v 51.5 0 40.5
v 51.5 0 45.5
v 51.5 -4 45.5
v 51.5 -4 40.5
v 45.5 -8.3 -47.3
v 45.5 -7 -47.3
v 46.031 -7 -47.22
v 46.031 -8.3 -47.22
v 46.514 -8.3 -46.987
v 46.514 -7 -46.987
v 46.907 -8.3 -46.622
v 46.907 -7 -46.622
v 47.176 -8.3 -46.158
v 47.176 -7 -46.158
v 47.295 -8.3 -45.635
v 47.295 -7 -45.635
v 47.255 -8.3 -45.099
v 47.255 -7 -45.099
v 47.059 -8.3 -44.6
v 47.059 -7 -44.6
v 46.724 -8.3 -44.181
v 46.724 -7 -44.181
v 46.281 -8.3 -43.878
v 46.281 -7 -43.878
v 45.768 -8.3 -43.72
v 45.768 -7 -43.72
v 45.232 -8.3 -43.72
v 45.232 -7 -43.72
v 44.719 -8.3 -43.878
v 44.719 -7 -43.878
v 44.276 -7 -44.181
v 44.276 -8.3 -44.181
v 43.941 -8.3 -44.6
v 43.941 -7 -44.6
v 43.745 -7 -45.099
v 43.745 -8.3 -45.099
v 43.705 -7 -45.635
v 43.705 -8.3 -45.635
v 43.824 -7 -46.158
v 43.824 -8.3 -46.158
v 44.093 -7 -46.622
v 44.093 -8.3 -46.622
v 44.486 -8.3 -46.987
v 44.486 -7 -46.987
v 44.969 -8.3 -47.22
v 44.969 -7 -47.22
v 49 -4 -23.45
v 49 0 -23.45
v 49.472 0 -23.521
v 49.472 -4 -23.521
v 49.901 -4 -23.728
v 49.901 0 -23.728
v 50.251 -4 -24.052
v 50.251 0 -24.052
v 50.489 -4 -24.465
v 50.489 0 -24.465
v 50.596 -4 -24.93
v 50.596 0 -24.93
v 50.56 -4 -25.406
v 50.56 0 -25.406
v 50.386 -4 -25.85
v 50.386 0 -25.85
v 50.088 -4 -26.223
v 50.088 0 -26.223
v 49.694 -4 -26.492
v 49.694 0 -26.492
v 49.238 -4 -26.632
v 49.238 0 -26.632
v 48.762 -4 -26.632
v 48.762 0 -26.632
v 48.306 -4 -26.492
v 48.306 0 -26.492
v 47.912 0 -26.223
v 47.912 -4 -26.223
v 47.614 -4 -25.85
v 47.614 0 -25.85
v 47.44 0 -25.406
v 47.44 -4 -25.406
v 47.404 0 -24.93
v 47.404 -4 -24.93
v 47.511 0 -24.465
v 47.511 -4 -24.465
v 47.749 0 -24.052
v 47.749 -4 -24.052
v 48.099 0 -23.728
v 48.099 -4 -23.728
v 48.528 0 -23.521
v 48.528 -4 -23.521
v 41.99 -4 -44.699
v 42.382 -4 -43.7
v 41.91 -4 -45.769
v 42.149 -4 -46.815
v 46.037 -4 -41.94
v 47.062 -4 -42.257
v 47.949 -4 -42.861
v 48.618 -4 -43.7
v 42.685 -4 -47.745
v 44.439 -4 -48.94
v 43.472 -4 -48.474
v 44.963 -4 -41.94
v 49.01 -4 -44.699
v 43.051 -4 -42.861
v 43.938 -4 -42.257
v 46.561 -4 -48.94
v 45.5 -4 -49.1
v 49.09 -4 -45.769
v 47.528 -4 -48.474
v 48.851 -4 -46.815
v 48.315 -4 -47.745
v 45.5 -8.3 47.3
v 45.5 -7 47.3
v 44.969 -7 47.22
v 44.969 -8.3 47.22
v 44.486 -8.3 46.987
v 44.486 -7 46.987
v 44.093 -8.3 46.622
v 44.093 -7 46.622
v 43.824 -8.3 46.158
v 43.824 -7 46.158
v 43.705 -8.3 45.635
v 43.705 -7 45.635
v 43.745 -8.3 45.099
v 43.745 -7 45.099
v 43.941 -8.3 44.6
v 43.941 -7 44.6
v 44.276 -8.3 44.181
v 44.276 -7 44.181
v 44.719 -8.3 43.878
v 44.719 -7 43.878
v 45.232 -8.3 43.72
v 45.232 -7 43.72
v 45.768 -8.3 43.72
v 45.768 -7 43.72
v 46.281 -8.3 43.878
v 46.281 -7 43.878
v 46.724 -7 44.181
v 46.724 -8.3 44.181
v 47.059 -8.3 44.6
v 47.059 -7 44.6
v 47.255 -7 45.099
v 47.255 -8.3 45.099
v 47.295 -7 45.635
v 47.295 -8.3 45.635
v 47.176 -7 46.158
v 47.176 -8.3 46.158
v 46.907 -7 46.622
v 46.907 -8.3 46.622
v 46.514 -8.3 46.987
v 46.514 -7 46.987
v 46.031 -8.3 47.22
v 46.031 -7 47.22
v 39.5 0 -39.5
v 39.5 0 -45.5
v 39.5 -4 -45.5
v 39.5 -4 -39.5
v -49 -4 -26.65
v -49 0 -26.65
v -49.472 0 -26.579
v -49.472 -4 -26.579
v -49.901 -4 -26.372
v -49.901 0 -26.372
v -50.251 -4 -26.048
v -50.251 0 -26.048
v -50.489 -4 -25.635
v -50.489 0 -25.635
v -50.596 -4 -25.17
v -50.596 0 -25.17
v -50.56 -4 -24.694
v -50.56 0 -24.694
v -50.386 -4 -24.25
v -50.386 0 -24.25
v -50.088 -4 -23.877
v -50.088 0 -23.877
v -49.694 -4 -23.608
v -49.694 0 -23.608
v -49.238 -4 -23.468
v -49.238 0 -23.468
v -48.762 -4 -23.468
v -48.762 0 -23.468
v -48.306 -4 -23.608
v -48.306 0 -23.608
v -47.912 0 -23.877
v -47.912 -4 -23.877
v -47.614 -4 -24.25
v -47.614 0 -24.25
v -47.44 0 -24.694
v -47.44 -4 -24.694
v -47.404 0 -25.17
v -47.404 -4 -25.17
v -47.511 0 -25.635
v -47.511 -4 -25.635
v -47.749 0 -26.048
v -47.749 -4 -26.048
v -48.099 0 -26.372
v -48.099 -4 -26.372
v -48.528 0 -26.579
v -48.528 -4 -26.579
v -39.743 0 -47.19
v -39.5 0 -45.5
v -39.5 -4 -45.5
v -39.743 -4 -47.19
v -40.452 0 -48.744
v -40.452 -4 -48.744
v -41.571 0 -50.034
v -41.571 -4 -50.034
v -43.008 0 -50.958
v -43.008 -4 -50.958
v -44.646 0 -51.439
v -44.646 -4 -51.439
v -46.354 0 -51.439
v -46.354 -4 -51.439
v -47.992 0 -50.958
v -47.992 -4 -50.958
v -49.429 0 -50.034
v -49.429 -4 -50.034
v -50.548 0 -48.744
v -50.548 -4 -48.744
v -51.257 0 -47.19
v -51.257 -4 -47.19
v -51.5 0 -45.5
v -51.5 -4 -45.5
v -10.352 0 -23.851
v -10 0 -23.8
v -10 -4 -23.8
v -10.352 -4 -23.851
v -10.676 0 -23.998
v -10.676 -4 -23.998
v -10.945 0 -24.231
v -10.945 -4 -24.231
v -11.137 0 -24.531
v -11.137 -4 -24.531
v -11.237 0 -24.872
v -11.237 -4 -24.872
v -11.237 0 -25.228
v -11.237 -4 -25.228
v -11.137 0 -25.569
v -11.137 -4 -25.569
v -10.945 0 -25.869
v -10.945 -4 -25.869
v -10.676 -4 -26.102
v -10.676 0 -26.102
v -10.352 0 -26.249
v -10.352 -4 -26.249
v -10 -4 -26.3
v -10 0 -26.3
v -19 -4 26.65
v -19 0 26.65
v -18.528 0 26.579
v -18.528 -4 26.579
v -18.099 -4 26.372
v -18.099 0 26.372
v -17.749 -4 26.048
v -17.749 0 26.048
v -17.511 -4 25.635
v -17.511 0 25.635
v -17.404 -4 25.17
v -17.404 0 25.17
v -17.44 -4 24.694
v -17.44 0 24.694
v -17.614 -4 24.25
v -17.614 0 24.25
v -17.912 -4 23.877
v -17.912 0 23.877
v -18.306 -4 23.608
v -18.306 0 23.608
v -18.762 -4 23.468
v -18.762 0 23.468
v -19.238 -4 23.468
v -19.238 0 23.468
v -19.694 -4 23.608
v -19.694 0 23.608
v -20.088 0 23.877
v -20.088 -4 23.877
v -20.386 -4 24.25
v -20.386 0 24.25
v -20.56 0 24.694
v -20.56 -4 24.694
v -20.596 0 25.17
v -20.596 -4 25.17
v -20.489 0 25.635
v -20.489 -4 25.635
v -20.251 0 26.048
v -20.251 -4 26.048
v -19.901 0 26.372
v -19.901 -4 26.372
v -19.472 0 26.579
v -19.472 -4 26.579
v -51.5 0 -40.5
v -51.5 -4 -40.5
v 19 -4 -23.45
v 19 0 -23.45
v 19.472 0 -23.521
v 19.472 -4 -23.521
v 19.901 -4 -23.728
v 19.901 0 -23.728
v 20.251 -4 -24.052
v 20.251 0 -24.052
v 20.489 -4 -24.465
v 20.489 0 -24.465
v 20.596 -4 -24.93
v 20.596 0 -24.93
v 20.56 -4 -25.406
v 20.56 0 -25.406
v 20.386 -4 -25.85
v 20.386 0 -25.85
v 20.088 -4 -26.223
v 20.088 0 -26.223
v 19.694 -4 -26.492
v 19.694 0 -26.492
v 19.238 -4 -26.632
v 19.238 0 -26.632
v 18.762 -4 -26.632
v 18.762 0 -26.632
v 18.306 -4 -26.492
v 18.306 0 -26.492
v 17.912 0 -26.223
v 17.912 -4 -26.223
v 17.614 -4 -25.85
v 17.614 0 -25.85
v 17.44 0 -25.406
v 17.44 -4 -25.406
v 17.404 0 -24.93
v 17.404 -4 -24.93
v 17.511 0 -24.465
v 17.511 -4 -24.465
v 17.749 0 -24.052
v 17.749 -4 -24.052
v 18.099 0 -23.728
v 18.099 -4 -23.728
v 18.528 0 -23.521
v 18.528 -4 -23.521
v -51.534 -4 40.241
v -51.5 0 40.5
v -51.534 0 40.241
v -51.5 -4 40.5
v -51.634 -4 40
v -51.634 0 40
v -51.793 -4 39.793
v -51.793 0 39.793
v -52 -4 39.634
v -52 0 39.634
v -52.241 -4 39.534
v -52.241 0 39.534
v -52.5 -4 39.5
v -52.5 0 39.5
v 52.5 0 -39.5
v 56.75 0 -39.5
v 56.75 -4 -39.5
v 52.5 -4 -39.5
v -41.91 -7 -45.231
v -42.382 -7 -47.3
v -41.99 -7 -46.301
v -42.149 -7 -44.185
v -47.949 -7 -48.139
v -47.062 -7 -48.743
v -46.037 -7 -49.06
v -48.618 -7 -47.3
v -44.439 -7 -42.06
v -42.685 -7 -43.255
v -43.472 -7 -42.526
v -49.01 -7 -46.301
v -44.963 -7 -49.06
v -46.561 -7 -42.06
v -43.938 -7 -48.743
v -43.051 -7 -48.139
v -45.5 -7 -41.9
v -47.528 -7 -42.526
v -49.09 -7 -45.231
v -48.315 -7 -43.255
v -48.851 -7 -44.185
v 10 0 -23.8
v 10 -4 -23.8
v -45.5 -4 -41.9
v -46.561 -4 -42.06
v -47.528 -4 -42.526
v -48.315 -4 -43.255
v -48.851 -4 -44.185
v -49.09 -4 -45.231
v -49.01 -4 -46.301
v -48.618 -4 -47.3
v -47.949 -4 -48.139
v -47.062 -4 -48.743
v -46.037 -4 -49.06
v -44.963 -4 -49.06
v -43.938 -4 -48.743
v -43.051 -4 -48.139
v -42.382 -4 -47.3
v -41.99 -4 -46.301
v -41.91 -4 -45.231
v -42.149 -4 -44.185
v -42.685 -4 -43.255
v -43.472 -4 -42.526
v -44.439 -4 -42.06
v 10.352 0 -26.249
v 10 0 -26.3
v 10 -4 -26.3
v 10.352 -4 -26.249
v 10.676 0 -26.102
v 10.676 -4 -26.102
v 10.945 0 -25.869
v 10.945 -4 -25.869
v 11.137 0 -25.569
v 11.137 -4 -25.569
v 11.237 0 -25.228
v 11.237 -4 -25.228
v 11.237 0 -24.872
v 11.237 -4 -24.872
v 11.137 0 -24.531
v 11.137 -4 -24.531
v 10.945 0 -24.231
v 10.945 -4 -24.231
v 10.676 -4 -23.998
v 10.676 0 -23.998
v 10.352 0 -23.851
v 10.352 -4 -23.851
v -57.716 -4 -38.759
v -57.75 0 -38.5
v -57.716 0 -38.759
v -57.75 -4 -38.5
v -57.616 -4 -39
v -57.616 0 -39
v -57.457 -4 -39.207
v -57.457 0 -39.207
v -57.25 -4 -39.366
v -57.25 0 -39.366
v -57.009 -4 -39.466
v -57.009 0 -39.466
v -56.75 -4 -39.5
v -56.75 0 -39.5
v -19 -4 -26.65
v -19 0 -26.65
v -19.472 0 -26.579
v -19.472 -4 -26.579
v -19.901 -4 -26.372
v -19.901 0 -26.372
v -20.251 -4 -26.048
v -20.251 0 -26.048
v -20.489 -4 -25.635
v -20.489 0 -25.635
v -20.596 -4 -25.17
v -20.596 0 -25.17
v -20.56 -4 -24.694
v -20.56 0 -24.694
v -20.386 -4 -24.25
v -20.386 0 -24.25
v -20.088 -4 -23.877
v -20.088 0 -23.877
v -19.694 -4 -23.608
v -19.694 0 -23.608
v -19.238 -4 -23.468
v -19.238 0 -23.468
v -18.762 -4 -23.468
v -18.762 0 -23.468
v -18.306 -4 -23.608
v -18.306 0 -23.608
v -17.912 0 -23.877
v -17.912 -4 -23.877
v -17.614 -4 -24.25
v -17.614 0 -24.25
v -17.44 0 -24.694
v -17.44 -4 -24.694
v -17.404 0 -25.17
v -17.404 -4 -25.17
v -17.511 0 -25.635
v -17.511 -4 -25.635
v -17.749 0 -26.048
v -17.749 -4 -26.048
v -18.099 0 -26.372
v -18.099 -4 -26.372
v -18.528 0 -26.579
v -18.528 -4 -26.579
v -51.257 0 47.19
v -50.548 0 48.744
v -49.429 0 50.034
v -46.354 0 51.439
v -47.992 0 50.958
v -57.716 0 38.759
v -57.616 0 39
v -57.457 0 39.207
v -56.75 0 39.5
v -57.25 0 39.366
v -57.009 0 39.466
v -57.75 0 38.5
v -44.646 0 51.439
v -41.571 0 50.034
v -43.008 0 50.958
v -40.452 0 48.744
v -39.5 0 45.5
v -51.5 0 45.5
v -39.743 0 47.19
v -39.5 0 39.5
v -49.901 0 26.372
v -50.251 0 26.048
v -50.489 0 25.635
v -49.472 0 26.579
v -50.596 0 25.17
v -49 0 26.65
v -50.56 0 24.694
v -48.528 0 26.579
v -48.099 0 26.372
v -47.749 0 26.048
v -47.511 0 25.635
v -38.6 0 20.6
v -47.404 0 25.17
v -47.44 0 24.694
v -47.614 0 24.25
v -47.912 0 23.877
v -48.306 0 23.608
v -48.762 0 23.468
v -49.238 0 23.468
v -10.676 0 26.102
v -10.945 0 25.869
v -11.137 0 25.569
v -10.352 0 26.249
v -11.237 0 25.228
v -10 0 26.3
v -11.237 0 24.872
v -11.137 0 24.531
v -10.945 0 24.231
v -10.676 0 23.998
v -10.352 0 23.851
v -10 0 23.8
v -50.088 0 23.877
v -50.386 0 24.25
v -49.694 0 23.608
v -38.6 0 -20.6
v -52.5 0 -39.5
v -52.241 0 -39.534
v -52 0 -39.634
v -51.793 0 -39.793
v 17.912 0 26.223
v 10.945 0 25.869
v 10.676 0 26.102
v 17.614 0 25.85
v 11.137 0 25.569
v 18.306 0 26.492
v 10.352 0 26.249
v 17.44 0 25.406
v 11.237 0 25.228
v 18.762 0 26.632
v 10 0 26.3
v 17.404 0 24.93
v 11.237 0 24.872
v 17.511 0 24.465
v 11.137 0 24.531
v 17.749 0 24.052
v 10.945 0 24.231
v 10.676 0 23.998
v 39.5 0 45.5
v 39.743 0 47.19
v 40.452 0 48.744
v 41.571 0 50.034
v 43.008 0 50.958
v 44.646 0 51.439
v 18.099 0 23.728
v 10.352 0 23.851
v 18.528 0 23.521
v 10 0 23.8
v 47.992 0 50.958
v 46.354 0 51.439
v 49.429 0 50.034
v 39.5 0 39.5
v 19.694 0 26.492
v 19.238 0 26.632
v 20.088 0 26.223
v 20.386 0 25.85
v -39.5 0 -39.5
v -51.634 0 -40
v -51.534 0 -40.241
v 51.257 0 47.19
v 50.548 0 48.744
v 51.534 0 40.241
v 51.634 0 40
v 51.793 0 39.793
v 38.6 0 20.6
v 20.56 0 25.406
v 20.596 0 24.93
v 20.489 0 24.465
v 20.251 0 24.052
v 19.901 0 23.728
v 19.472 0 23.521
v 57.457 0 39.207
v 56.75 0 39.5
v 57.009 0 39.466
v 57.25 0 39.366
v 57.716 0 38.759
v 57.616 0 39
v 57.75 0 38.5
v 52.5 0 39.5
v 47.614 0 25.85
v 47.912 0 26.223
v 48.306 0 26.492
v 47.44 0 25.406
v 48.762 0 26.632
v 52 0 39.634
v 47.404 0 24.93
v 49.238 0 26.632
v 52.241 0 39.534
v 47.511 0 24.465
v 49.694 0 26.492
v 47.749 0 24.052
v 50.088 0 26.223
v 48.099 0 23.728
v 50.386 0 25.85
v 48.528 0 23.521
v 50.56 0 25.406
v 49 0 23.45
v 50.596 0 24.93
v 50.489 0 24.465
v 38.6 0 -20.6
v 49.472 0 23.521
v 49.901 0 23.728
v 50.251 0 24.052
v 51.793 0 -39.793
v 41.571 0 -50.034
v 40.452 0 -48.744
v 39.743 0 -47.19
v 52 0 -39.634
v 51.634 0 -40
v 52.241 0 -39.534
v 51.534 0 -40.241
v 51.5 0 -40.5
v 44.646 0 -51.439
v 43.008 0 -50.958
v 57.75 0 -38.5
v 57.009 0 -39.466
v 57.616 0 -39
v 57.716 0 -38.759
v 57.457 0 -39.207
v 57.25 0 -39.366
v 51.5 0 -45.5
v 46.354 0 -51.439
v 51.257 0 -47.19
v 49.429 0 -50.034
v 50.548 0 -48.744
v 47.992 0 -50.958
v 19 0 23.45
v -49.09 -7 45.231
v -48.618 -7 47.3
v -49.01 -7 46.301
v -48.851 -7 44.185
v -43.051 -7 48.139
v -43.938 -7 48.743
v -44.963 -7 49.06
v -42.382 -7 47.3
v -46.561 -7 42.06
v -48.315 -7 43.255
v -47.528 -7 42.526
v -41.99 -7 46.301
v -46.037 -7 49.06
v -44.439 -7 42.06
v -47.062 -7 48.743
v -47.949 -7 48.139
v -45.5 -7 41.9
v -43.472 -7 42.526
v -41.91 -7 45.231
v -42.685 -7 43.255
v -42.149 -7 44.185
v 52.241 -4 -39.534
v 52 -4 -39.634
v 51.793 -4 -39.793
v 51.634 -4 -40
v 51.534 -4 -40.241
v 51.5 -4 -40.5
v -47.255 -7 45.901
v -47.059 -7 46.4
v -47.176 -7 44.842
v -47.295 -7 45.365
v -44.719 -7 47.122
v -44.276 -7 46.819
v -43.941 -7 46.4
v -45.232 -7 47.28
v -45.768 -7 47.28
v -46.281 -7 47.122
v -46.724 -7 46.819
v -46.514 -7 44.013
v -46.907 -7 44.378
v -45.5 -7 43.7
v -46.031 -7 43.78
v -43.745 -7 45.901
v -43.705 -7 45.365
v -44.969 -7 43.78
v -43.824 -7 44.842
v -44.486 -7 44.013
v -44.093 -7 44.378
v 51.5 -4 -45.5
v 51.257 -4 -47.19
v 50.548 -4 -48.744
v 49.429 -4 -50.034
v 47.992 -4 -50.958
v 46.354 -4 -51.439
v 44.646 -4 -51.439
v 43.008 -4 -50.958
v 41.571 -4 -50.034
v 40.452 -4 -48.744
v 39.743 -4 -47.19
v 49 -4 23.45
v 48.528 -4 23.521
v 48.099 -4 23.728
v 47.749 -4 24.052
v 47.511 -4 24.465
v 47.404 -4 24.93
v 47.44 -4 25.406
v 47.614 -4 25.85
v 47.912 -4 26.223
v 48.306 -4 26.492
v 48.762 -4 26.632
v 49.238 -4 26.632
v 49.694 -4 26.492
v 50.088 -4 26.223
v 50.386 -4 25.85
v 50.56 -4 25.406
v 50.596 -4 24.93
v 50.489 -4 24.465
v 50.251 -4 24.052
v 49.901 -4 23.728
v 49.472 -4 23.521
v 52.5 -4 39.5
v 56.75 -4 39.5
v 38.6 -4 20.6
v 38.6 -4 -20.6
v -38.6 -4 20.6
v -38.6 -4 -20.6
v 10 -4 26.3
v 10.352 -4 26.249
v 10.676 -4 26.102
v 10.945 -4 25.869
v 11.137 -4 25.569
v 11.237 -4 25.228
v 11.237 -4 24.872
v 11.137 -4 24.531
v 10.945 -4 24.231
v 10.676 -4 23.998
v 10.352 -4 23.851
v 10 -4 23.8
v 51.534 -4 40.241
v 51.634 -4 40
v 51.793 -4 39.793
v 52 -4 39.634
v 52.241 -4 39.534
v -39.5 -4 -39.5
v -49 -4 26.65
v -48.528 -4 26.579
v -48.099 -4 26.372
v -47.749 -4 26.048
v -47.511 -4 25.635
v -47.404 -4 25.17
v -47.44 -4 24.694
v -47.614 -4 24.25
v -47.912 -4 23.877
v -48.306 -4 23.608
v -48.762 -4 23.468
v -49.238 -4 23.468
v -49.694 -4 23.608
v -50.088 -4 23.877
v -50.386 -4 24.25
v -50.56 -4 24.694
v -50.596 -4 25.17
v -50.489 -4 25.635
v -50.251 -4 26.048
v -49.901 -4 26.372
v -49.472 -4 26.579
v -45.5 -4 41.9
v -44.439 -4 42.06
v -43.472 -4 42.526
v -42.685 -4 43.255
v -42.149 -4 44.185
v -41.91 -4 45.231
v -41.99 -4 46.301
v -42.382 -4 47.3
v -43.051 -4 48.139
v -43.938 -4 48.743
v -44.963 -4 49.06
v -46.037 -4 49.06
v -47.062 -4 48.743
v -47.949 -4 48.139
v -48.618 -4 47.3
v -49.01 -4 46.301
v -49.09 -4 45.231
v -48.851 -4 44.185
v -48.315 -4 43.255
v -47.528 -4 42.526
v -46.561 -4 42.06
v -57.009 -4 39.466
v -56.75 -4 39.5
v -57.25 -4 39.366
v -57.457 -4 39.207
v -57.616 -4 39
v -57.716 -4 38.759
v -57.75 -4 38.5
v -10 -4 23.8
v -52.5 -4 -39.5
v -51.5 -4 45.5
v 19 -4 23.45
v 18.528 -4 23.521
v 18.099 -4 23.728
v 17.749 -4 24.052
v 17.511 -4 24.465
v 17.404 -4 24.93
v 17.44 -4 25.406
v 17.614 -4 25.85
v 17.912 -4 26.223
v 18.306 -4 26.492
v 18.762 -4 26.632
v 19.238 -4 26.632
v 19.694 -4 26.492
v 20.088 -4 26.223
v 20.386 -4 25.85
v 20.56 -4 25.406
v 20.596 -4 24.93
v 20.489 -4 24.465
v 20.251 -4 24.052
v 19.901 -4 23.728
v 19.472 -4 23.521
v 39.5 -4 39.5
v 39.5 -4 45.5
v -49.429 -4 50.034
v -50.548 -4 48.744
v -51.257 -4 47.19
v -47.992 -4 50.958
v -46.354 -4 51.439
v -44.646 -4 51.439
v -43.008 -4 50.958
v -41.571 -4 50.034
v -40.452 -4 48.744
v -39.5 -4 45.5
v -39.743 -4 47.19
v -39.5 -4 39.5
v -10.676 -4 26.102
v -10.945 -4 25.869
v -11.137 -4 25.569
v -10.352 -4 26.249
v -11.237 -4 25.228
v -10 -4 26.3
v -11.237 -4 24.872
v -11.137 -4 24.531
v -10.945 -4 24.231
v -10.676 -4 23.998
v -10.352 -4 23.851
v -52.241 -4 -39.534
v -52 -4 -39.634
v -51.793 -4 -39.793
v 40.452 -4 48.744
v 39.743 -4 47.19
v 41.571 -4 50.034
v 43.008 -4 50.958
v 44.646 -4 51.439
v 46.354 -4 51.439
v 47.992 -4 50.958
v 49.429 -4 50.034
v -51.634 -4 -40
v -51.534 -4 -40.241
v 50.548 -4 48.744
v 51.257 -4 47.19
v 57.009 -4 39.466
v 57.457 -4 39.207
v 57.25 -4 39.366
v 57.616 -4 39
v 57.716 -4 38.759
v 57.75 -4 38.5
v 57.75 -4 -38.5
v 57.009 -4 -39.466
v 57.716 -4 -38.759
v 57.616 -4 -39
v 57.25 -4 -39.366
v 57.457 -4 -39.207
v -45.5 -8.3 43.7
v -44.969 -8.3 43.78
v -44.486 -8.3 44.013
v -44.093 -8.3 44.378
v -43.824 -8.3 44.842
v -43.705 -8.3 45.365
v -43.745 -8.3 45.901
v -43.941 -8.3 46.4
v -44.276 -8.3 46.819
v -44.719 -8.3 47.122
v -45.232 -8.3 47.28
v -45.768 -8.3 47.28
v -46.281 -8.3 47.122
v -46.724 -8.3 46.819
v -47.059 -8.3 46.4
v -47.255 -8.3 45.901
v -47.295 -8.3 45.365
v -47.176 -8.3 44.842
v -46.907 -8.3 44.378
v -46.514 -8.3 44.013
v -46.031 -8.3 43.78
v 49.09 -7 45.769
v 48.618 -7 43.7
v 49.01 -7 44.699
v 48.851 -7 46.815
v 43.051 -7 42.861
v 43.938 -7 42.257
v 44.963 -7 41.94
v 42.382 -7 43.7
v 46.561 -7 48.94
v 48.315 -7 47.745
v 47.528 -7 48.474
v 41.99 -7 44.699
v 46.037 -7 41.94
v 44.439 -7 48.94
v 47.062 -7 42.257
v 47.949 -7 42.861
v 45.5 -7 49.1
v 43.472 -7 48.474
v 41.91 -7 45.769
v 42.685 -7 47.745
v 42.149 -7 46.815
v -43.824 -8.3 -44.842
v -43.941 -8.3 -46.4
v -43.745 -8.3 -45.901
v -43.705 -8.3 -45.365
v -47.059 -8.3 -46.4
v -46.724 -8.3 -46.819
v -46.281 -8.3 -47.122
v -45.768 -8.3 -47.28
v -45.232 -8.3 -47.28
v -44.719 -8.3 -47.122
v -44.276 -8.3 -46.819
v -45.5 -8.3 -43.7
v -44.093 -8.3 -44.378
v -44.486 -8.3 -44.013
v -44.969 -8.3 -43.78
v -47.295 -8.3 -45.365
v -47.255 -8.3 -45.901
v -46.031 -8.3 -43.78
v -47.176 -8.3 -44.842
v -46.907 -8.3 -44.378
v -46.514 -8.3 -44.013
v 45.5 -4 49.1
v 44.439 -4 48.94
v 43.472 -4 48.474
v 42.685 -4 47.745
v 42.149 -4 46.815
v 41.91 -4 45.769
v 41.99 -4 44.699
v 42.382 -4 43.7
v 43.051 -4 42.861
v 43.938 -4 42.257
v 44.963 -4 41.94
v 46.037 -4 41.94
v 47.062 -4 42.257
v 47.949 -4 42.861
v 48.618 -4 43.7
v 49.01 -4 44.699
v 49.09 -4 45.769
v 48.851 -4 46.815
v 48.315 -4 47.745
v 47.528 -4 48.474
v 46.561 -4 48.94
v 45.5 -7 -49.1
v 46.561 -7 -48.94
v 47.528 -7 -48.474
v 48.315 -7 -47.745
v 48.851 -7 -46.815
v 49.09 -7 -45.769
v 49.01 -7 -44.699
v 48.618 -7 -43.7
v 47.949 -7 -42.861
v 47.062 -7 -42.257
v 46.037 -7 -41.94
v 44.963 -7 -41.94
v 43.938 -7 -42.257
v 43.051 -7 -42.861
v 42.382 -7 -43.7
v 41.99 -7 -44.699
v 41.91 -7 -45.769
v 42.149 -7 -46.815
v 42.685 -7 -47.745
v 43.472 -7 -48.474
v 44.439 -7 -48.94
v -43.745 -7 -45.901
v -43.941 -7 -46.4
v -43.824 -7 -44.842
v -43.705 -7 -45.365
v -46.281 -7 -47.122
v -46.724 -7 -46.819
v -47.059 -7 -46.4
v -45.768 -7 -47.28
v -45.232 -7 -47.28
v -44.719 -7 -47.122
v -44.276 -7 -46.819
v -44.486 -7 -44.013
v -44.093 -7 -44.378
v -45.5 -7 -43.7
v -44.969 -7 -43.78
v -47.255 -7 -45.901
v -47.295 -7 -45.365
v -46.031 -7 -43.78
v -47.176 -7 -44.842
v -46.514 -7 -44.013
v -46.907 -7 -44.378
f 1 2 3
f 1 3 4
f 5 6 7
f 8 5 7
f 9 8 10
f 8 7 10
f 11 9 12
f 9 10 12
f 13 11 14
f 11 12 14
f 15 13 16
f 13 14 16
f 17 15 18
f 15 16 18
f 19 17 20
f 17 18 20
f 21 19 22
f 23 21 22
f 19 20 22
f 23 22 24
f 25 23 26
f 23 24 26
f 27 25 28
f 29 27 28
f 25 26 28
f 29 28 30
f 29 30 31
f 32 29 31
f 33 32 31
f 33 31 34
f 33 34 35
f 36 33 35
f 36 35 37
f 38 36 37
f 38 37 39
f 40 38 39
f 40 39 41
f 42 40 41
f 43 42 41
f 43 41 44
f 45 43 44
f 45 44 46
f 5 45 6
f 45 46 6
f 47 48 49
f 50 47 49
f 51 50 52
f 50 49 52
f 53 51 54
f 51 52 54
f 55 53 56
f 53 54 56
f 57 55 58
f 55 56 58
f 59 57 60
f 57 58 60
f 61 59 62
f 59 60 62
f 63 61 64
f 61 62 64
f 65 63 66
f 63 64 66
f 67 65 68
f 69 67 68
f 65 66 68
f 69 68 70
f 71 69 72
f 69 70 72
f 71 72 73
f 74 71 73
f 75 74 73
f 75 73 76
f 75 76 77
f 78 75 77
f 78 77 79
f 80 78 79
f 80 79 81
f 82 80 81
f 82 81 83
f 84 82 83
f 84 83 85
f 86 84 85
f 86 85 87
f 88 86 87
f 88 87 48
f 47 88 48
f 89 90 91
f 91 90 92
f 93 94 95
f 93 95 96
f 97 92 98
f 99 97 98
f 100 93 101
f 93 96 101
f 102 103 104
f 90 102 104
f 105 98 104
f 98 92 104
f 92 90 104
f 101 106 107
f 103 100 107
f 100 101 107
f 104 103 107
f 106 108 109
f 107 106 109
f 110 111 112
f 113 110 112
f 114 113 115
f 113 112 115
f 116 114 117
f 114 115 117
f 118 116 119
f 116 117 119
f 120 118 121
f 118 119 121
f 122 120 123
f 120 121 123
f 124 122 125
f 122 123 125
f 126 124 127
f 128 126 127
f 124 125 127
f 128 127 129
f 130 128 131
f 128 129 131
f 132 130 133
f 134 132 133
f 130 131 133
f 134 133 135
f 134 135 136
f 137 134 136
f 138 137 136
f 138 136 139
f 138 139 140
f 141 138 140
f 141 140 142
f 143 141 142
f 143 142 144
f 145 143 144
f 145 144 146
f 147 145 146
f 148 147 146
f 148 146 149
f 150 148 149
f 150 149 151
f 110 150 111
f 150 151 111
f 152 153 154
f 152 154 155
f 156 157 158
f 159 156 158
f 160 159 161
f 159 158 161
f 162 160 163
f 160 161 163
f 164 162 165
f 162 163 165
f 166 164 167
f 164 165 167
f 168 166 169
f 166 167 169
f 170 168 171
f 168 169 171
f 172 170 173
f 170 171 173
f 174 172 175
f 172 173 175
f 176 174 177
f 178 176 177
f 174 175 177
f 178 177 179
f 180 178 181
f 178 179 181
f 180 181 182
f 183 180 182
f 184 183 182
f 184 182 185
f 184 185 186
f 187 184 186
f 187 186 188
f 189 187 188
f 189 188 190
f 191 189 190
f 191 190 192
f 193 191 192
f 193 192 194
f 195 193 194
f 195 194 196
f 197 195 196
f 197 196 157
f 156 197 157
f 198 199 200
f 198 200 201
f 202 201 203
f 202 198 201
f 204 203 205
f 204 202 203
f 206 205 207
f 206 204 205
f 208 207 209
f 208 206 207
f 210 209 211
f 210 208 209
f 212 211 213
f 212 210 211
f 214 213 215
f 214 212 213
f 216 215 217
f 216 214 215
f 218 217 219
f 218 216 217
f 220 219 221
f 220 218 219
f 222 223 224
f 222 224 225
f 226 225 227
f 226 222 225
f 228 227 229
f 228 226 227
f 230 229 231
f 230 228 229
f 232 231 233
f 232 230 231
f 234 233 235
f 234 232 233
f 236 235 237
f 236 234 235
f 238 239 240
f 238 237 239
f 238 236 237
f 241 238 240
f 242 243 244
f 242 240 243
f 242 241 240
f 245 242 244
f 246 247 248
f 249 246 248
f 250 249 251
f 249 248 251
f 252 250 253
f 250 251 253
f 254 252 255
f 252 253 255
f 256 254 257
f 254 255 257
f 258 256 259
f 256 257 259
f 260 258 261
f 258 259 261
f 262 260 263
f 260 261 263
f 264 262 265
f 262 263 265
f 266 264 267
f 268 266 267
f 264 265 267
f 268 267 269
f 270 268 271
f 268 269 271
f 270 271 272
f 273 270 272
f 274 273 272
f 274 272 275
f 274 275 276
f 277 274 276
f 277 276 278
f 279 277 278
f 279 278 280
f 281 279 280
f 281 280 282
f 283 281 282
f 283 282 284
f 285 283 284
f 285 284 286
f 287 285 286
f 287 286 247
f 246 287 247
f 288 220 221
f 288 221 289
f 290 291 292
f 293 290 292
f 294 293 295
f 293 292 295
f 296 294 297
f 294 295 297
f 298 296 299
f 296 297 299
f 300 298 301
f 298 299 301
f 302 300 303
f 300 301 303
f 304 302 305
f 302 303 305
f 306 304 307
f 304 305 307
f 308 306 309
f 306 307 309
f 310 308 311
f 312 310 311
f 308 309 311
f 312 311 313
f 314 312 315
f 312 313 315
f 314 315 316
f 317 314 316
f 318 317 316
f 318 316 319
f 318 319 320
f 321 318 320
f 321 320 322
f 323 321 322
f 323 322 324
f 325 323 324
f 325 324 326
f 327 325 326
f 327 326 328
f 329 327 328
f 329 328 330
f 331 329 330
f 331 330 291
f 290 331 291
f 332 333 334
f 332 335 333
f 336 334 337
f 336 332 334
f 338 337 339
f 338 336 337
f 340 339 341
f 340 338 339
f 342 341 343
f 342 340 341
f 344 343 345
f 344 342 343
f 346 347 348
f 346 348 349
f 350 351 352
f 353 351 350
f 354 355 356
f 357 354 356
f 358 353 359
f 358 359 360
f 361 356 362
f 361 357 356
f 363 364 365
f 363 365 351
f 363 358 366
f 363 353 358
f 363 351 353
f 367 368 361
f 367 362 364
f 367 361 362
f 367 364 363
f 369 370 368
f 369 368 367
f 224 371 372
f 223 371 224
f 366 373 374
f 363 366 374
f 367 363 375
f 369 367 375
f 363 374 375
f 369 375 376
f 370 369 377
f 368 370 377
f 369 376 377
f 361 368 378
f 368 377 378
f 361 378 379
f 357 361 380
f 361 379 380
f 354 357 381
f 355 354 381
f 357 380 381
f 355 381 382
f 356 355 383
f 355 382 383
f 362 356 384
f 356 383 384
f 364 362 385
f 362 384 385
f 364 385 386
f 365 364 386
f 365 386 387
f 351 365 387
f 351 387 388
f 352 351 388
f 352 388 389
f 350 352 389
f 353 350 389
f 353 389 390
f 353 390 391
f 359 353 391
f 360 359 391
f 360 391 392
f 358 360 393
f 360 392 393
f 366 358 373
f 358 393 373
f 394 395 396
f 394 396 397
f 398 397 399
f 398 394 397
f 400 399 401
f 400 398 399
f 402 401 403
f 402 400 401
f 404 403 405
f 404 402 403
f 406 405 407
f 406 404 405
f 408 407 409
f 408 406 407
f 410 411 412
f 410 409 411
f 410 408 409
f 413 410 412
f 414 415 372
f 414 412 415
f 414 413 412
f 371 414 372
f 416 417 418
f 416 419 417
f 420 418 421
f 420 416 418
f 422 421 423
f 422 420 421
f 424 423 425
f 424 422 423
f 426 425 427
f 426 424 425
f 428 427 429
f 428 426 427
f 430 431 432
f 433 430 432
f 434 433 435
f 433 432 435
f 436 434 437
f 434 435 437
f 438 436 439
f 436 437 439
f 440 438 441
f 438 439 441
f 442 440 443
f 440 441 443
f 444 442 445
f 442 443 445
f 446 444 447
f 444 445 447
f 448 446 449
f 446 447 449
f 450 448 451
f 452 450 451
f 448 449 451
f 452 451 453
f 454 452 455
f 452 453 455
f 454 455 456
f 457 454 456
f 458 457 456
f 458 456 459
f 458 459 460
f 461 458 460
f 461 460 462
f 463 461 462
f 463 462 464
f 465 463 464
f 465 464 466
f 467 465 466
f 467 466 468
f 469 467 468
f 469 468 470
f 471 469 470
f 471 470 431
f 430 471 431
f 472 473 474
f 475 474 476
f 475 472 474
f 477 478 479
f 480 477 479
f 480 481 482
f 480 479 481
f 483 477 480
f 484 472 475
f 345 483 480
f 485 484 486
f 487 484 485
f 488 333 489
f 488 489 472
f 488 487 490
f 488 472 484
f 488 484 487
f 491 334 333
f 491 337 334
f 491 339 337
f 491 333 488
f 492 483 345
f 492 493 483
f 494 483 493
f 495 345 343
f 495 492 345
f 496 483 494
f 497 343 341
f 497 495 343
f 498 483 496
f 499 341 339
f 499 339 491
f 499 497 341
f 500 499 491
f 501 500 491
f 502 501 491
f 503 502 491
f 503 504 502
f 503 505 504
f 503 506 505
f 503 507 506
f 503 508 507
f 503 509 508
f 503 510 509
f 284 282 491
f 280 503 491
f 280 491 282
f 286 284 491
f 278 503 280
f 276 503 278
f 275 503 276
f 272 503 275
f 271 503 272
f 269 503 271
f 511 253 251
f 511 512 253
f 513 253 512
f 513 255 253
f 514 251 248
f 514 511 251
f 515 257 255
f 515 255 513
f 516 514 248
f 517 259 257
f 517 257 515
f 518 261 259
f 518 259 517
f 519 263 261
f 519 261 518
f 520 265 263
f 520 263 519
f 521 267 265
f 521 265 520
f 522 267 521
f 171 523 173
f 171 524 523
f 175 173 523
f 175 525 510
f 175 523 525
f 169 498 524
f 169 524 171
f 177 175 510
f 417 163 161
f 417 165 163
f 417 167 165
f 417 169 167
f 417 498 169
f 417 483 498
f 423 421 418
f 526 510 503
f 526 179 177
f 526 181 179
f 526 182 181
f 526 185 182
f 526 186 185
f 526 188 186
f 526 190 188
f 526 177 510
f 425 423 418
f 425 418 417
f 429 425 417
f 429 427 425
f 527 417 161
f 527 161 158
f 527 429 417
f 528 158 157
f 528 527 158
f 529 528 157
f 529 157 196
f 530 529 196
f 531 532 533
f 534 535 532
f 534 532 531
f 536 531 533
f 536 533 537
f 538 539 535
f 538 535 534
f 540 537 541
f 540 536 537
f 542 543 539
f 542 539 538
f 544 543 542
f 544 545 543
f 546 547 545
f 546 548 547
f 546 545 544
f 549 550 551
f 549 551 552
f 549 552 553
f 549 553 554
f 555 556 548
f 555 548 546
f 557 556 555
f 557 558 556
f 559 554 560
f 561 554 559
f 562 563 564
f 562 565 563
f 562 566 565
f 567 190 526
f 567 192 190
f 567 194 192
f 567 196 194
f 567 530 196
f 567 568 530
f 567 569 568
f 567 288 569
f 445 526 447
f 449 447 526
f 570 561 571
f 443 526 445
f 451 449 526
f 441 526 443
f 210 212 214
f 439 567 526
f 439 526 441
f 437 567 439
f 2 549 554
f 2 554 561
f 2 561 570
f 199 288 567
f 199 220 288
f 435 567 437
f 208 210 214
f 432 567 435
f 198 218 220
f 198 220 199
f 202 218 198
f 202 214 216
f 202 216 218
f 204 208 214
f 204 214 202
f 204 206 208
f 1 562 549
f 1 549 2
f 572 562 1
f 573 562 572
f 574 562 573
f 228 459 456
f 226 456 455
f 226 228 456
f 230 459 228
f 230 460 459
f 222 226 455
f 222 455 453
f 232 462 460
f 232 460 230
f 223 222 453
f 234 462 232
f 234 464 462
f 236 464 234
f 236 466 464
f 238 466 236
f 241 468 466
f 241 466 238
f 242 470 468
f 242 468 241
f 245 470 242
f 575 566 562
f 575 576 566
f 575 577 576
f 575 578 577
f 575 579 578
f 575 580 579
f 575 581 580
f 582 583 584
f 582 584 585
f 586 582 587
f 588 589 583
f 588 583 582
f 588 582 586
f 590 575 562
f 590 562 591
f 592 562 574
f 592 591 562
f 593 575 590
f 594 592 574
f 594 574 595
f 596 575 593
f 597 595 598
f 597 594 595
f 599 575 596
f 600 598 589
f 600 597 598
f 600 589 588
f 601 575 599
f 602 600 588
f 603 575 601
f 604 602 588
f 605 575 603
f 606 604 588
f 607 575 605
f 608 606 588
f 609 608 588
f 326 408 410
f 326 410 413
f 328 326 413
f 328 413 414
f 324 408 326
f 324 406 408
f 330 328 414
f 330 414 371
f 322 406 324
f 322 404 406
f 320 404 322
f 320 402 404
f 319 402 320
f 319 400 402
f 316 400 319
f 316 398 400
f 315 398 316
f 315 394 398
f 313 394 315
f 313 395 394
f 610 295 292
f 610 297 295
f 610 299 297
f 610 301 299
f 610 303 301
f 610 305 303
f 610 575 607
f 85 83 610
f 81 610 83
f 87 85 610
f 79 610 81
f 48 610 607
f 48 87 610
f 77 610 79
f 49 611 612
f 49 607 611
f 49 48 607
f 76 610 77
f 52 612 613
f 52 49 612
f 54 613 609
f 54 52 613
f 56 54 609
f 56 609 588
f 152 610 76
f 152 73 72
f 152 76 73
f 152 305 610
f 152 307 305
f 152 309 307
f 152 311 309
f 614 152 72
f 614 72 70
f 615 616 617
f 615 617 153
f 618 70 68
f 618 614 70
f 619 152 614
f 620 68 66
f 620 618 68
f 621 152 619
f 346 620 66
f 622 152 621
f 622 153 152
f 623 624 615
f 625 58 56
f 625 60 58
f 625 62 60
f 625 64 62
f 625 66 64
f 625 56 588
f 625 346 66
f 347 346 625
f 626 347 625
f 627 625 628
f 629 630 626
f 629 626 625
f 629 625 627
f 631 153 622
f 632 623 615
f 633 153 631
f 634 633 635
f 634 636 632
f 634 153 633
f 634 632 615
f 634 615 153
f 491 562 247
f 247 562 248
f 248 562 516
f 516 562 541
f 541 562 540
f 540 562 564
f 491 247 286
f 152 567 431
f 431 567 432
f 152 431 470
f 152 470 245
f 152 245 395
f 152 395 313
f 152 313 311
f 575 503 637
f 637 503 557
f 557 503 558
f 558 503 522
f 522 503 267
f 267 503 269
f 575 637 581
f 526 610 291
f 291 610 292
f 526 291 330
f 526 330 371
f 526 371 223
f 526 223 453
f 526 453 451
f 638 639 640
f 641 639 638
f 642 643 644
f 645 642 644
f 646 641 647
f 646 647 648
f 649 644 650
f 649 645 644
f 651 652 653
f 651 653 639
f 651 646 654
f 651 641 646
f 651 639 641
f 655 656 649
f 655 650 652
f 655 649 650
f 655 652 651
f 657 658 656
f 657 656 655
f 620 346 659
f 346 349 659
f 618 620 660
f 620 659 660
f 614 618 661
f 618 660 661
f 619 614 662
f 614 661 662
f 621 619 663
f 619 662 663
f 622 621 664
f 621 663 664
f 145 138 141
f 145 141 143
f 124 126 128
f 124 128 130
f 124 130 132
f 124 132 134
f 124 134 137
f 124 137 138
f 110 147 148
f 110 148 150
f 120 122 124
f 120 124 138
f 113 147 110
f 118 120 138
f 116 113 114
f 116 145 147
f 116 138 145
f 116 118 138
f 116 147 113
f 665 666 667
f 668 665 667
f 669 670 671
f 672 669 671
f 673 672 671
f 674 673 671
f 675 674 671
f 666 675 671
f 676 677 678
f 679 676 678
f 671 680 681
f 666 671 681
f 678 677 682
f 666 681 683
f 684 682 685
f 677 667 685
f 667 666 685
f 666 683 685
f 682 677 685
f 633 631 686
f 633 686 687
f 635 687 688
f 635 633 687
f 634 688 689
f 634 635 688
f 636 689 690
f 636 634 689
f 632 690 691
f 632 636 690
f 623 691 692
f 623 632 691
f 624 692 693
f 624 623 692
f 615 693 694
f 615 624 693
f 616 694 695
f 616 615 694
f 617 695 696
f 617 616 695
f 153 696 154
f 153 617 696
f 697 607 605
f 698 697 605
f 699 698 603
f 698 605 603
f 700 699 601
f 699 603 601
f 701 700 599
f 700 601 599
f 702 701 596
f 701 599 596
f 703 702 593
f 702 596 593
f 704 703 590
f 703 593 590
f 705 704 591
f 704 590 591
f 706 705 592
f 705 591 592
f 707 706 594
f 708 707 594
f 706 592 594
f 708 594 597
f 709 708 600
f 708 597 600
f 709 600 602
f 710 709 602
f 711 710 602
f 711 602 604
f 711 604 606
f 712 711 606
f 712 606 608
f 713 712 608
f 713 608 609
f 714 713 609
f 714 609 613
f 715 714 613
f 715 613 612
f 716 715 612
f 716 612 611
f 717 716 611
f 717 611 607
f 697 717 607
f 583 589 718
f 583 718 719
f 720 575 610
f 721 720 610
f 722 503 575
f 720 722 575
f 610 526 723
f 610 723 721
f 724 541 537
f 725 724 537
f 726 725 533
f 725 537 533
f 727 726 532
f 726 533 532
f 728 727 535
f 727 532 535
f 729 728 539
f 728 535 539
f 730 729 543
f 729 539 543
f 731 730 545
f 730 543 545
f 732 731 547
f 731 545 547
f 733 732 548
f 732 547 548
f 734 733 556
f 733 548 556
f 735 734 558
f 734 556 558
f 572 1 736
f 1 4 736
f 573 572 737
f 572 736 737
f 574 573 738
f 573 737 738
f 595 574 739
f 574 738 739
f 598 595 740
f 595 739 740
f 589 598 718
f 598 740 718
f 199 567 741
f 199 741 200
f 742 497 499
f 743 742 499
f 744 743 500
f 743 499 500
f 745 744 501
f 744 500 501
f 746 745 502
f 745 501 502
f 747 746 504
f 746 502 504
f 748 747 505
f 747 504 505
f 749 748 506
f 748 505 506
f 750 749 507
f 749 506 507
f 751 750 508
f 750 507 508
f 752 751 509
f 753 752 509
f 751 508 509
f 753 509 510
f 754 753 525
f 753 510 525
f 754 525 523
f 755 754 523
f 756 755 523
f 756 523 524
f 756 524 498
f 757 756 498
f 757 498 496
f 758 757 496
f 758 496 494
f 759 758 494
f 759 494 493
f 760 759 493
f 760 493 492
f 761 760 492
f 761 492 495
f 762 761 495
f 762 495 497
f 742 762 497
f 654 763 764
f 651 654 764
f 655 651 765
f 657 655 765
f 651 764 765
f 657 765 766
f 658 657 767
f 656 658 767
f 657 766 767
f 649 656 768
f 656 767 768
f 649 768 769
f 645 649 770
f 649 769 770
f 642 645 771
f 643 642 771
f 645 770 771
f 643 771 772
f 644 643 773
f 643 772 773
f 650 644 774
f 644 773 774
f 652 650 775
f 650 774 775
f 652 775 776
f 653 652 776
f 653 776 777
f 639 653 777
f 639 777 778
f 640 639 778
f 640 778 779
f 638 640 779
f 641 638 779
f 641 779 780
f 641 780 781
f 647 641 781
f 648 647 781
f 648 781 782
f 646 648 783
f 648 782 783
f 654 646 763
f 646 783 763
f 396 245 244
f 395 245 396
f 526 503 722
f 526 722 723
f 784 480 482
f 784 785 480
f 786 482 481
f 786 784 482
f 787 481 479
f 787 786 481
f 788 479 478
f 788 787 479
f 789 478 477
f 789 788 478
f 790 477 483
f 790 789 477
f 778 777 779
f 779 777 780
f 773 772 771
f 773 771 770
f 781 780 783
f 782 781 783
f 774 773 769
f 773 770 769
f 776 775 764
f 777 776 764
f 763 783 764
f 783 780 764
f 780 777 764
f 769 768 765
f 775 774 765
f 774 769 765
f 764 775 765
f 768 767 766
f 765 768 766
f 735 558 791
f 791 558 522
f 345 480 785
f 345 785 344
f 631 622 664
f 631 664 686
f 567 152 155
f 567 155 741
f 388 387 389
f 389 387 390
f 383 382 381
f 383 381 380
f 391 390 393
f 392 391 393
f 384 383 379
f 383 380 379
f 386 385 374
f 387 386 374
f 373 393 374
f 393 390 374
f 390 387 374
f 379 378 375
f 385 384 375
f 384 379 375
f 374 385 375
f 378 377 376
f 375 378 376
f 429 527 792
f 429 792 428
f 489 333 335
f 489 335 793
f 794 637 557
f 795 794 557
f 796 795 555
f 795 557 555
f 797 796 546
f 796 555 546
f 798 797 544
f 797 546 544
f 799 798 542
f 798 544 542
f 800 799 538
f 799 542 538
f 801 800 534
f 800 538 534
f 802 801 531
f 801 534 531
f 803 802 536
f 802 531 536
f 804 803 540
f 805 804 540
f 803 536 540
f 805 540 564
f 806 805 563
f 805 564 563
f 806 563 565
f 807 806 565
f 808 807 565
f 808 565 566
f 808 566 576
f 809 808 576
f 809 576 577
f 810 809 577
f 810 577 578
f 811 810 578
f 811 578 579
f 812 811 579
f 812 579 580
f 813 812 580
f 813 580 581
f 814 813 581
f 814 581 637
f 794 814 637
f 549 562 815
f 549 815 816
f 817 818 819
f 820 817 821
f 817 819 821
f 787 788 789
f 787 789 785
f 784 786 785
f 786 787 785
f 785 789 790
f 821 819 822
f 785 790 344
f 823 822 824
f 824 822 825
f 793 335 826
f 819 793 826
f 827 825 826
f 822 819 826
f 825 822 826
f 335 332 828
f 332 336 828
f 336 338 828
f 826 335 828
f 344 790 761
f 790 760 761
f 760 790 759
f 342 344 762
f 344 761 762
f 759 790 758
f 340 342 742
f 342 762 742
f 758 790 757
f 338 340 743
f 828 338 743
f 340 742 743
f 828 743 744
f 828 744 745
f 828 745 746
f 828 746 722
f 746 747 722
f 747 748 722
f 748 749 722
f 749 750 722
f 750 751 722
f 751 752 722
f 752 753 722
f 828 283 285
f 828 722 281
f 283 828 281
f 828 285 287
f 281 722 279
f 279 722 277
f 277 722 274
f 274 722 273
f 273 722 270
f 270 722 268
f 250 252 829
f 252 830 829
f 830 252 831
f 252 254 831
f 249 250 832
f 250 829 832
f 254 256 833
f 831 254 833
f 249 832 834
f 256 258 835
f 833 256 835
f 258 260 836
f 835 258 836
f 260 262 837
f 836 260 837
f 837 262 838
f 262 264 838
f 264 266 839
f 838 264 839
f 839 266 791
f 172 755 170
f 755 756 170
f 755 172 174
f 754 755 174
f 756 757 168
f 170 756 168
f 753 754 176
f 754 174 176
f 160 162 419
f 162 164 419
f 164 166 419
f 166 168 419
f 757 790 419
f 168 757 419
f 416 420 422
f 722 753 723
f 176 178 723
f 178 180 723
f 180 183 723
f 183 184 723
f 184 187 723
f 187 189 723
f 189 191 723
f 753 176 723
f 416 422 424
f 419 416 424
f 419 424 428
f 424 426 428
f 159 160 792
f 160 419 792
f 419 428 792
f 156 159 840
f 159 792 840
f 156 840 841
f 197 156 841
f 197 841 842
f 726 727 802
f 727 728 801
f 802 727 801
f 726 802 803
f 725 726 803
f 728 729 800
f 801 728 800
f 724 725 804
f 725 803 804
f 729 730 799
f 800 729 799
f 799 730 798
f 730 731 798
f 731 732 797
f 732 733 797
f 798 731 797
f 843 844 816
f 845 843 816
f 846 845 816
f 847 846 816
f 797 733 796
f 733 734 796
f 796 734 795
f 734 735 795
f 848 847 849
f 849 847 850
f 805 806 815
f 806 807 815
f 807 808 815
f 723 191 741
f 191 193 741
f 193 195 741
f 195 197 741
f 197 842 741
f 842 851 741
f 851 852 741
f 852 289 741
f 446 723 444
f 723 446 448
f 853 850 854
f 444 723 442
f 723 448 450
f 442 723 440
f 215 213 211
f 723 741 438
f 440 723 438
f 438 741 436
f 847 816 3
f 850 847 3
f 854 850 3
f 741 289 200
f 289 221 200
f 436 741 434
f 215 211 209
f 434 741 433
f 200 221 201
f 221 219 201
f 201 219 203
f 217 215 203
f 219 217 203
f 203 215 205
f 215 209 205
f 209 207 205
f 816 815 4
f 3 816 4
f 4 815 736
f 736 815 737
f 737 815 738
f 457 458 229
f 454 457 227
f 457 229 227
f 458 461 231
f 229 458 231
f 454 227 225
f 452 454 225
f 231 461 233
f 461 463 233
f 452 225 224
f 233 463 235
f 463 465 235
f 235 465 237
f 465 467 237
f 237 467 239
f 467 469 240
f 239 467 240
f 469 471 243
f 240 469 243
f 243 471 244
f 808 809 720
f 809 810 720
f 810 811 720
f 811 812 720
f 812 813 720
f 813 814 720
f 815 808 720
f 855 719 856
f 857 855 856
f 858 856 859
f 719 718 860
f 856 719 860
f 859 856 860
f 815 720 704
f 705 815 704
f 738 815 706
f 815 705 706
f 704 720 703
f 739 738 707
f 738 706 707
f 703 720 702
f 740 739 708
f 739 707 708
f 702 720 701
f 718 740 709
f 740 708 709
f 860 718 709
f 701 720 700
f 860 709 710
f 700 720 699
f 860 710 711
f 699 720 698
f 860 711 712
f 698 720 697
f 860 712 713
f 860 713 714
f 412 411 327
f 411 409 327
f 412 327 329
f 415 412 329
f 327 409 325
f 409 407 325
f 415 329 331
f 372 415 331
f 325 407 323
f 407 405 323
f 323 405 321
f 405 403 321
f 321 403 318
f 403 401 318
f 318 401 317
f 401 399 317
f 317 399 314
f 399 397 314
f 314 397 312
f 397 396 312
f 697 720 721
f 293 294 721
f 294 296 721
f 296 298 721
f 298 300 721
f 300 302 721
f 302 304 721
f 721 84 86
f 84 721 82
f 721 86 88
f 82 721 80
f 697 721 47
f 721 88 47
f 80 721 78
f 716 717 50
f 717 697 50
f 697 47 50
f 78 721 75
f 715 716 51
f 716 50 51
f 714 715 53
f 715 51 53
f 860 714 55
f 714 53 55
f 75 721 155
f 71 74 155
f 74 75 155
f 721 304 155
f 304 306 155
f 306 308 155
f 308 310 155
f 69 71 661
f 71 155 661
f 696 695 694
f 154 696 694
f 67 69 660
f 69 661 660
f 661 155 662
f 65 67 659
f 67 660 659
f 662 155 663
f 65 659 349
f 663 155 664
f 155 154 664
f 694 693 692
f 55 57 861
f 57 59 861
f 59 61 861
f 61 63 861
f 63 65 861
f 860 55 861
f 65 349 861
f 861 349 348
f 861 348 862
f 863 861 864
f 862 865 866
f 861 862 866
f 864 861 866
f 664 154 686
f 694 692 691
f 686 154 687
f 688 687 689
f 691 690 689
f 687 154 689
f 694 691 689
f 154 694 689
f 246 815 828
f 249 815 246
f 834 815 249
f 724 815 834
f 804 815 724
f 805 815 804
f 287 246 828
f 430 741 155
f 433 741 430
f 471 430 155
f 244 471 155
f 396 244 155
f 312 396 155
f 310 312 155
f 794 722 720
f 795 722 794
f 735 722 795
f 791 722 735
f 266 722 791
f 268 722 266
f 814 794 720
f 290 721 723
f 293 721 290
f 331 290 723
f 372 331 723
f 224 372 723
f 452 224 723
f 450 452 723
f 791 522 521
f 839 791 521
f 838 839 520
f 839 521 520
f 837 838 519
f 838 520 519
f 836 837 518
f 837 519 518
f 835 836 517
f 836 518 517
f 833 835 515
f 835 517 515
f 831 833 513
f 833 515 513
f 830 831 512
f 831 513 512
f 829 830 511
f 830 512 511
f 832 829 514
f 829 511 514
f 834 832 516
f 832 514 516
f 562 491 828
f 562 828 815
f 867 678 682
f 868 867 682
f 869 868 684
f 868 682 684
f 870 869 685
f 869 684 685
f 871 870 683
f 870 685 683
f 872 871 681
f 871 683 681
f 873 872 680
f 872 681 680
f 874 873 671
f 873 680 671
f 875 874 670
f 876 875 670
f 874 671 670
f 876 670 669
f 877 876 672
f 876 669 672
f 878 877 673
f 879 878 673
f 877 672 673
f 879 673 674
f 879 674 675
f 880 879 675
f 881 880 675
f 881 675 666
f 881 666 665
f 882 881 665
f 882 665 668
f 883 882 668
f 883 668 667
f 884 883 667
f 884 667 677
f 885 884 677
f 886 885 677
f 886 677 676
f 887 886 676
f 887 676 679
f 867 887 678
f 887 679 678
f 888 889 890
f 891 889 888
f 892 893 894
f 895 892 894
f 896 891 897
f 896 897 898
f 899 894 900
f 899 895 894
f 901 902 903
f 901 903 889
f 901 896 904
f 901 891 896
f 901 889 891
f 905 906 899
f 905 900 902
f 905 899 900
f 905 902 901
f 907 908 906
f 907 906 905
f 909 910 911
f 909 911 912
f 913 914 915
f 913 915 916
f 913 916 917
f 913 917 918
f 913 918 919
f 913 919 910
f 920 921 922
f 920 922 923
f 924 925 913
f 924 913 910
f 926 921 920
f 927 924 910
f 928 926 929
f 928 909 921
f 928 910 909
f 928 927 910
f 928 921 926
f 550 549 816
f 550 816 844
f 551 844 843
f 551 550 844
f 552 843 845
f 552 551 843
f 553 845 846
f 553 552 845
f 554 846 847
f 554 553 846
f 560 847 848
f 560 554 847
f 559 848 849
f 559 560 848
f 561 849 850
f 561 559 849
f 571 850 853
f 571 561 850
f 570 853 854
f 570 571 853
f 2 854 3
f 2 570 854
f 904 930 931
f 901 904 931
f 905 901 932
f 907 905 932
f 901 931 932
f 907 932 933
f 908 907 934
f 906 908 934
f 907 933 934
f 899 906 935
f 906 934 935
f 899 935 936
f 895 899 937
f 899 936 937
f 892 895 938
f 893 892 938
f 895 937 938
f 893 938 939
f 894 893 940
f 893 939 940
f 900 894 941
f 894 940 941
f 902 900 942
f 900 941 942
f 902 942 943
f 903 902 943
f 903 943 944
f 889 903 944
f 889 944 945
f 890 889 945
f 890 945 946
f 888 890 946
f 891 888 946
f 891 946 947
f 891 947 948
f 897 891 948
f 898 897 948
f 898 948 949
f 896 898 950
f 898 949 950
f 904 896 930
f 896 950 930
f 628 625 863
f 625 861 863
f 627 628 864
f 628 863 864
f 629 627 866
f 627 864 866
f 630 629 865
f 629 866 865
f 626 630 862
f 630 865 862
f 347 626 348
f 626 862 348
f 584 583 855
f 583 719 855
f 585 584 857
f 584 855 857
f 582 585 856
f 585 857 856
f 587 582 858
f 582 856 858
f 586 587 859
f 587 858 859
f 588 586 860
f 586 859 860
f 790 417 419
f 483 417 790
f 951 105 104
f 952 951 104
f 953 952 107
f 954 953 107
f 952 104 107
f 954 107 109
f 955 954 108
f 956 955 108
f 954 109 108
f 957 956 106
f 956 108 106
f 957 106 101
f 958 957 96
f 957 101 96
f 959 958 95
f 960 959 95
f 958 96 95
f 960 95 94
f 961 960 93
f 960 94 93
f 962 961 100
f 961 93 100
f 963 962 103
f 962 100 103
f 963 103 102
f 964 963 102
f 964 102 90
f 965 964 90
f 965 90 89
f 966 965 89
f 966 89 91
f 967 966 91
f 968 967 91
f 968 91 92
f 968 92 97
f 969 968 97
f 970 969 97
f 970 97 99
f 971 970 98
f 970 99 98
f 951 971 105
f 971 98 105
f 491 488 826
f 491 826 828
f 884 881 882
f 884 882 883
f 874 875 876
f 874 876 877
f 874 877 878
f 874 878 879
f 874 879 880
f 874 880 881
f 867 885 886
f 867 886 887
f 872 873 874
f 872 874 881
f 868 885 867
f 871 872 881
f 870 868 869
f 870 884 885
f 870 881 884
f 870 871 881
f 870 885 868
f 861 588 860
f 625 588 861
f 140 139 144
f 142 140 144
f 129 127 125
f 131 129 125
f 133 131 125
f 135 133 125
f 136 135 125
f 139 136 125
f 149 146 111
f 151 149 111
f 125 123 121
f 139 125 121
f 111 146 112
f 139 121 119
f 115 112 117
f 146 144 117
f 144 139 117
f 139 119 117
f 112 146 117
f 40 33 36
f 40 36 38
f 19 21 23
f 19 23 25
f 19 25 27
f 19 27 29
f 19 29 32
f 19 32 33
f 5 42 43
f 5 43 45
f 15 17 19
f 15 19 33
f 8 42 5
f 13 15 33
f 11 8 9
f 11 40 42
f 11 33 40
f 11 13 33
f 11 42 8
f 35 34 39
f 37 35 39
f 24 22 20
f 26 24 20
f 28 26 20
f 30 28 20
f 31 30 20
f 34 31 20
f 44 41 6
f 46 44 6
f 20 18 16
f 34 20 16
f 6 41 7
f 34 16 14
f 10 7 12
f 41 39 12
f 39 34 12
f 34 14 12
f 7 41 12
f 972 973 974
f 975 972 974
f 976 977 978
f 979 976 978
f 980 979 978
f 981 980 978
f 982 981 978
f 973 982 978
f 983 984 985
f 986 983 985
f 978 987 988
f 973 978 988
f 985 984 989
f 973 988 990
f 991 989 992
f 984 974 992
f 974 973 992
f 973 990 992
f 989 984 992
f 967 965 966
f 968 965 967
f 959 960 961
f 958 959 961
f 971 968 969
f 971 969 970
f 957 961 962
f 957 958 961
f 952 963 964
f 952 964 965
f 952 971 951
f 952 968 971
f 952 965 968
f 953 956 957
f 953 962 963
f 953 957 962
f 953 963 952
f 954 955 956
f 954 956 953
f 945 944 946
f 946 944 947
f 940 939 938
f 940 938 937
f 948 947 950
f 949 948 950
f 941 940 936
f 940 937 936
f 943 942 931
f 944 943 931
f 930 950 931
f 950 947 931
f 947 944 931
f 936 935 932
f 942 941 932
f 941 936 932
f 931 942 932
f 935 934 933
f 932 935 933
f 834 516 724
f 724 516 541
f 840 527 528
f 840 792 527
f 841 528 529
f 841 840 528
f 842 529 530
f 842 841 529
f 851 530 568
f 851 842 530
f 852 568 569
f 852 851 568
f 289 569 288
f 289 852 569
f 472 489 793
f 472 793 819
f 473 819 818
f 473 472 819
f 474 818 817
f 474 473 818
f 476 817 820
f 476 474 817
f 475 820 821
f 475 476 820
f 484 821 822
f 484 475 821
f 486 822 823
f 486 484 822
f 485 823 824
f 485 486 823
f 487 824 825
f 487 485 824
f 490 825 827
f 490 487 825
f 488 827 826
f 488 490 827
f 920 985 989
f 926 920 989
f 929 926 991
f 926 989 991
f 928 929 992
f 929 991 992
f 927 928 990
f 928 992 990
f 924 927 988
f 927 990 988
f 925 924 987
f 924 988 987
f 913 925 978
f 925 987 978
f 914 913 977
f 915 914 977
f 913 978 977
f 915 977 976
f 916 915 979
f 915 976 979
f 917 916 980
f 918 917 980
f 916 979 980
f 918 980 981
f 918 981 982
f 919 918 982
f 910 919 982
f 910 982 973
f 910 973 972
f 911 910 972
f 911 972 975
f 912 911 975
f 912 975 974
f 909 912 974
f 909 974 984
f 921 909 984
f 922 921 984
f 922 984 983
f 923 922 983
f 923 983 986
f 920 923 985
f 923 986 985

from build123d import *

# Parameters (mm, degrees)
EXTRUDE_1_DEPTH     = 4
SKETCH_4_R          = 3.6
EXTRUDE_2_DEPTH     = 3
EXTRUDE_2_2_DEPTH   = 3
EXTRUDE_2_3_DEPTH   = 3
EXTRUDE_2_4_DEPTH   = 3
SKETCH_5_R          = 1.8
EXTRUDE_3_DEPTH     = 1.3
EXTRUDE_3_2_DEPTH   = 1.3
EXTRUDE_3_3_DEPTH   = 1.3
EXTRUDE_3_4_DEPTH   = 1.3
SKETCH_10_W         = 77.2
SKETCH_10_H         = 41.2
CUT_EXTRUDE_5_DEPTH = 78.821606897
SKETCH_16_R         = 1.6
CUT_EXTRUDE_6_DEPTH = 10
FILLET_1_R          = 1


with BuildPart() as part:
    # 草图1 → 凸台-拉伸1 (new body)
    with BuildSketch(Plane(origin=(0, 0, 0), x_dir=(1, 0, 0), z_dir=(0, 1, 0))):
        with BuildLine():
            Line((-39.5, -39.5), (39.5, -39.5))
            Line((39.5, -39.5), (39.5, -45.5))
            ThreePointArc((39.5, -45.5), (45.5, -51.5), (51.5, -45.5))
            Line((51.5, -45.5), (51.5, -39.5))
            Line((51.5, -39.5), (57.75, -39.5))
            Line((57.75, -39.5), (57.75, 39.5))
            Line((57.75, 39.5), (51.5, 39.5))
            Line((51.5, 39.5), (51.5, 45.5))
            ThreePointArc((51.5, 45.5), (45.5, 51.5), (39.5, 45.5))
            Line((39.5, 45.5), (39.5, 39.5))
            Line((39.5, 39.5), (-39.5, 39.5))
            Line((-39.5, 39.5), (-39.5, 45.5))
            ThreePointArc((-39.5, 45.5), (-45.5, 51.5), (-51.5, 45.5))
            Line((-51.5, 45.5), (-51.5, 39.5))
            Line((-51.5, 39.5), (-57.75, 39.5))
            Line((-57.75, 39.5), (-57.75, -39.5))
            Line((-57.75, -39.5), (-51.5, -39.5))
            Line((-51.5, -39.5), (-51.5, -45.5))
            ThreePointArc((-51.5, -45.5), (-45.5, -51.5), (-39.5, -45.5))
            Line((-39.5, -45.5), (-39.5, -39.5))
        make_face()
    extrude(amount=-EXTRUDE_1_DEPTH)

    # 草图10 → 切除-拉伸5 (cut, through all)
    with BuildSketch(Plane(origin=(0, 0, 0), x_dir=(1, 0, 0), z_dir=(0, 1, 0))):
        Rectangle(SKETCH_10_W, SKETCH_10_H)
    extrude(amount=-CUT_EXTRUDE_5_DEPTH, mode=Mode.SUBTRACT)

    # 草图16 → 切除-拉伸6 (cut)
    with BuildSketch(Plane(origin=(0, 0, 0), x_dir=(1, 0, 0), z_dir=(0, 1, 0))):
        with Locations((19, 25.05)):
            Circle(SKETCH_16_R)
        with Locations((49, 25.05)):
            Circle(SKETCH_16_R)
        with Locations((-49, 25.05)):
            Circle(SKETCH_16_R)
        with Locations((-19, 25.05)):
            Circle(SKETCH_16_R)
        with Locations((49, -25.05)):
            Circle(SKETCH_16_R)
        with Locations((19, -25.05)):
            Circle(SKETCH_16_R)
        with Locations((-19, -25.05)):
            Circle(SKETCH_16_R)
        with Locations((-49, -25.05)):
            Circle(SKETCH_16_R)
        with BuildLine():
            Line((-10, 26.3), (10, 26.3))
            ThreePointArc((10, 26.3), (11.25, 25.05), (10, 23.8))
            Line((10, 23.8), (-10, 23.8))
            ThreePointArc((-10, 23.8), (-11.25, 25.05), (-10, 26.3))
        make_face()
        with BuildLine():
            Line((-10, -26.3), (10, -26.3))
            ThreePointArc((10, -26.3), (11.25, -25.05), (10, -23.8))
            Line((10, -23.8), (-10, -23.8))
            ThreePointArc((-10, -23.8), (-11.25, -25.05), (-10, -26.3))
        make_face()
    extrude(amount=-CUT_EXTRUDE_6_DEPTH, mode=Mode.SUBTRACT)

    # 圆角1
    fillet_1_edges = [part.edges().sort_by_distance(p)[0] for p in [
        (-51.5, -2, -39.5),
        (51.5, -2, -39.5),
        (51.5, -2, 39.5),
        (-51.5, -2, 39.5),
        (-57.75, -2, 39.5),
        (-57.75, -2, -39.5),
        (57.75, -2, 39.5),
        (57.75, -2, -39.5),
    ]]
    fillet(fillet_1_edges, radius=FILLET_1_R)


with BuildPart() as body_2:
    # 草图4 → 凸台-拉伸2 (new body)
    with BuildSketch(Plane.XZ.offset(4)):
        with Locations((-45.5, 45.5)):
            Circle(SKETCH_4_R)
    extrude(amount=EXTRUDE_2_DEPTH)


with BuildPart() as body_3:
    # 草图4 → Extrude 2 2 (new body)
    with BuildSketch(Plane.XZ.offset(4)):
        with Locations((-45.5, -45.5)):
            Circle(SKETCH_4_R)
    extrude(amount=EXTRUDE_2_2_DEPTH)


with BuildPart() as body_4:
    # 草图4 → Extrude 2 3 (new body)
    with BuildSketch(Plane.XZ.offset(4)):
        with Locations((45.5, -45.5)):
            Circle(SKETCH_4_R)
    extrude(amount=EXTRUDE_2_3_DEPTH)


with BuildPart() as body_5:
    # 草图4 → Extrude 2 4 (new body)
    with BuildSketch(Plane.XZ.offset(4)):
        with Locations((45.5, 45.5)):
            Circle(SKETCH_4_R)
    extrude(amount=EXTRUDE_2_4_DEPTH)


with BuildPart() as body_6:
    # 草图5 → 凸台-拉伸3 (new body)
    with BuildSketch(Plane.XZ.offset(7)):
        with Locations((-45.5, 45.5)):
            Circle(SKETCH_5_R)
    extrude(amount=EXTRUDE_3_DEPTH)


with BuildPart() as body_7:
    # 草图5 → Extrude 3 2 (new body)
    with BuildSketch(Plane.XZ.offset(7)):
        with Locations((-45.5, -45.5)):
            Circle(SKETCH_5_R)
    extrude(amount=EXTRUDE_3_2_DEPTH)


with BuildPart() as body_8:
    # 草图5 → Extrude 3 3 (new body)
    with BuildSketch(Plane.XZ.offset(7)):
        with Locations((45.5, -45.5)):
            Circle(SKETCH_5_R)
    extrude(amount=EXTRUDE_3_3_DEPTH)


with BuildPart() as body_9:
    # 草图5 → Extrude 3 4 (new body)
    with BuildSketch(Plane.XZ.offset(7)):
        with Locations((45.5, 45.5)):
            Circle(SKETCH_5_R)
    extrude(amount=EXTRUDE_3_4_DEPTH)


solid = Compound([part.part, body_2.part, body_3.part, body_4.part, body_5.part, body_6.part, body_7.part, body_8.part, body_9.part])
